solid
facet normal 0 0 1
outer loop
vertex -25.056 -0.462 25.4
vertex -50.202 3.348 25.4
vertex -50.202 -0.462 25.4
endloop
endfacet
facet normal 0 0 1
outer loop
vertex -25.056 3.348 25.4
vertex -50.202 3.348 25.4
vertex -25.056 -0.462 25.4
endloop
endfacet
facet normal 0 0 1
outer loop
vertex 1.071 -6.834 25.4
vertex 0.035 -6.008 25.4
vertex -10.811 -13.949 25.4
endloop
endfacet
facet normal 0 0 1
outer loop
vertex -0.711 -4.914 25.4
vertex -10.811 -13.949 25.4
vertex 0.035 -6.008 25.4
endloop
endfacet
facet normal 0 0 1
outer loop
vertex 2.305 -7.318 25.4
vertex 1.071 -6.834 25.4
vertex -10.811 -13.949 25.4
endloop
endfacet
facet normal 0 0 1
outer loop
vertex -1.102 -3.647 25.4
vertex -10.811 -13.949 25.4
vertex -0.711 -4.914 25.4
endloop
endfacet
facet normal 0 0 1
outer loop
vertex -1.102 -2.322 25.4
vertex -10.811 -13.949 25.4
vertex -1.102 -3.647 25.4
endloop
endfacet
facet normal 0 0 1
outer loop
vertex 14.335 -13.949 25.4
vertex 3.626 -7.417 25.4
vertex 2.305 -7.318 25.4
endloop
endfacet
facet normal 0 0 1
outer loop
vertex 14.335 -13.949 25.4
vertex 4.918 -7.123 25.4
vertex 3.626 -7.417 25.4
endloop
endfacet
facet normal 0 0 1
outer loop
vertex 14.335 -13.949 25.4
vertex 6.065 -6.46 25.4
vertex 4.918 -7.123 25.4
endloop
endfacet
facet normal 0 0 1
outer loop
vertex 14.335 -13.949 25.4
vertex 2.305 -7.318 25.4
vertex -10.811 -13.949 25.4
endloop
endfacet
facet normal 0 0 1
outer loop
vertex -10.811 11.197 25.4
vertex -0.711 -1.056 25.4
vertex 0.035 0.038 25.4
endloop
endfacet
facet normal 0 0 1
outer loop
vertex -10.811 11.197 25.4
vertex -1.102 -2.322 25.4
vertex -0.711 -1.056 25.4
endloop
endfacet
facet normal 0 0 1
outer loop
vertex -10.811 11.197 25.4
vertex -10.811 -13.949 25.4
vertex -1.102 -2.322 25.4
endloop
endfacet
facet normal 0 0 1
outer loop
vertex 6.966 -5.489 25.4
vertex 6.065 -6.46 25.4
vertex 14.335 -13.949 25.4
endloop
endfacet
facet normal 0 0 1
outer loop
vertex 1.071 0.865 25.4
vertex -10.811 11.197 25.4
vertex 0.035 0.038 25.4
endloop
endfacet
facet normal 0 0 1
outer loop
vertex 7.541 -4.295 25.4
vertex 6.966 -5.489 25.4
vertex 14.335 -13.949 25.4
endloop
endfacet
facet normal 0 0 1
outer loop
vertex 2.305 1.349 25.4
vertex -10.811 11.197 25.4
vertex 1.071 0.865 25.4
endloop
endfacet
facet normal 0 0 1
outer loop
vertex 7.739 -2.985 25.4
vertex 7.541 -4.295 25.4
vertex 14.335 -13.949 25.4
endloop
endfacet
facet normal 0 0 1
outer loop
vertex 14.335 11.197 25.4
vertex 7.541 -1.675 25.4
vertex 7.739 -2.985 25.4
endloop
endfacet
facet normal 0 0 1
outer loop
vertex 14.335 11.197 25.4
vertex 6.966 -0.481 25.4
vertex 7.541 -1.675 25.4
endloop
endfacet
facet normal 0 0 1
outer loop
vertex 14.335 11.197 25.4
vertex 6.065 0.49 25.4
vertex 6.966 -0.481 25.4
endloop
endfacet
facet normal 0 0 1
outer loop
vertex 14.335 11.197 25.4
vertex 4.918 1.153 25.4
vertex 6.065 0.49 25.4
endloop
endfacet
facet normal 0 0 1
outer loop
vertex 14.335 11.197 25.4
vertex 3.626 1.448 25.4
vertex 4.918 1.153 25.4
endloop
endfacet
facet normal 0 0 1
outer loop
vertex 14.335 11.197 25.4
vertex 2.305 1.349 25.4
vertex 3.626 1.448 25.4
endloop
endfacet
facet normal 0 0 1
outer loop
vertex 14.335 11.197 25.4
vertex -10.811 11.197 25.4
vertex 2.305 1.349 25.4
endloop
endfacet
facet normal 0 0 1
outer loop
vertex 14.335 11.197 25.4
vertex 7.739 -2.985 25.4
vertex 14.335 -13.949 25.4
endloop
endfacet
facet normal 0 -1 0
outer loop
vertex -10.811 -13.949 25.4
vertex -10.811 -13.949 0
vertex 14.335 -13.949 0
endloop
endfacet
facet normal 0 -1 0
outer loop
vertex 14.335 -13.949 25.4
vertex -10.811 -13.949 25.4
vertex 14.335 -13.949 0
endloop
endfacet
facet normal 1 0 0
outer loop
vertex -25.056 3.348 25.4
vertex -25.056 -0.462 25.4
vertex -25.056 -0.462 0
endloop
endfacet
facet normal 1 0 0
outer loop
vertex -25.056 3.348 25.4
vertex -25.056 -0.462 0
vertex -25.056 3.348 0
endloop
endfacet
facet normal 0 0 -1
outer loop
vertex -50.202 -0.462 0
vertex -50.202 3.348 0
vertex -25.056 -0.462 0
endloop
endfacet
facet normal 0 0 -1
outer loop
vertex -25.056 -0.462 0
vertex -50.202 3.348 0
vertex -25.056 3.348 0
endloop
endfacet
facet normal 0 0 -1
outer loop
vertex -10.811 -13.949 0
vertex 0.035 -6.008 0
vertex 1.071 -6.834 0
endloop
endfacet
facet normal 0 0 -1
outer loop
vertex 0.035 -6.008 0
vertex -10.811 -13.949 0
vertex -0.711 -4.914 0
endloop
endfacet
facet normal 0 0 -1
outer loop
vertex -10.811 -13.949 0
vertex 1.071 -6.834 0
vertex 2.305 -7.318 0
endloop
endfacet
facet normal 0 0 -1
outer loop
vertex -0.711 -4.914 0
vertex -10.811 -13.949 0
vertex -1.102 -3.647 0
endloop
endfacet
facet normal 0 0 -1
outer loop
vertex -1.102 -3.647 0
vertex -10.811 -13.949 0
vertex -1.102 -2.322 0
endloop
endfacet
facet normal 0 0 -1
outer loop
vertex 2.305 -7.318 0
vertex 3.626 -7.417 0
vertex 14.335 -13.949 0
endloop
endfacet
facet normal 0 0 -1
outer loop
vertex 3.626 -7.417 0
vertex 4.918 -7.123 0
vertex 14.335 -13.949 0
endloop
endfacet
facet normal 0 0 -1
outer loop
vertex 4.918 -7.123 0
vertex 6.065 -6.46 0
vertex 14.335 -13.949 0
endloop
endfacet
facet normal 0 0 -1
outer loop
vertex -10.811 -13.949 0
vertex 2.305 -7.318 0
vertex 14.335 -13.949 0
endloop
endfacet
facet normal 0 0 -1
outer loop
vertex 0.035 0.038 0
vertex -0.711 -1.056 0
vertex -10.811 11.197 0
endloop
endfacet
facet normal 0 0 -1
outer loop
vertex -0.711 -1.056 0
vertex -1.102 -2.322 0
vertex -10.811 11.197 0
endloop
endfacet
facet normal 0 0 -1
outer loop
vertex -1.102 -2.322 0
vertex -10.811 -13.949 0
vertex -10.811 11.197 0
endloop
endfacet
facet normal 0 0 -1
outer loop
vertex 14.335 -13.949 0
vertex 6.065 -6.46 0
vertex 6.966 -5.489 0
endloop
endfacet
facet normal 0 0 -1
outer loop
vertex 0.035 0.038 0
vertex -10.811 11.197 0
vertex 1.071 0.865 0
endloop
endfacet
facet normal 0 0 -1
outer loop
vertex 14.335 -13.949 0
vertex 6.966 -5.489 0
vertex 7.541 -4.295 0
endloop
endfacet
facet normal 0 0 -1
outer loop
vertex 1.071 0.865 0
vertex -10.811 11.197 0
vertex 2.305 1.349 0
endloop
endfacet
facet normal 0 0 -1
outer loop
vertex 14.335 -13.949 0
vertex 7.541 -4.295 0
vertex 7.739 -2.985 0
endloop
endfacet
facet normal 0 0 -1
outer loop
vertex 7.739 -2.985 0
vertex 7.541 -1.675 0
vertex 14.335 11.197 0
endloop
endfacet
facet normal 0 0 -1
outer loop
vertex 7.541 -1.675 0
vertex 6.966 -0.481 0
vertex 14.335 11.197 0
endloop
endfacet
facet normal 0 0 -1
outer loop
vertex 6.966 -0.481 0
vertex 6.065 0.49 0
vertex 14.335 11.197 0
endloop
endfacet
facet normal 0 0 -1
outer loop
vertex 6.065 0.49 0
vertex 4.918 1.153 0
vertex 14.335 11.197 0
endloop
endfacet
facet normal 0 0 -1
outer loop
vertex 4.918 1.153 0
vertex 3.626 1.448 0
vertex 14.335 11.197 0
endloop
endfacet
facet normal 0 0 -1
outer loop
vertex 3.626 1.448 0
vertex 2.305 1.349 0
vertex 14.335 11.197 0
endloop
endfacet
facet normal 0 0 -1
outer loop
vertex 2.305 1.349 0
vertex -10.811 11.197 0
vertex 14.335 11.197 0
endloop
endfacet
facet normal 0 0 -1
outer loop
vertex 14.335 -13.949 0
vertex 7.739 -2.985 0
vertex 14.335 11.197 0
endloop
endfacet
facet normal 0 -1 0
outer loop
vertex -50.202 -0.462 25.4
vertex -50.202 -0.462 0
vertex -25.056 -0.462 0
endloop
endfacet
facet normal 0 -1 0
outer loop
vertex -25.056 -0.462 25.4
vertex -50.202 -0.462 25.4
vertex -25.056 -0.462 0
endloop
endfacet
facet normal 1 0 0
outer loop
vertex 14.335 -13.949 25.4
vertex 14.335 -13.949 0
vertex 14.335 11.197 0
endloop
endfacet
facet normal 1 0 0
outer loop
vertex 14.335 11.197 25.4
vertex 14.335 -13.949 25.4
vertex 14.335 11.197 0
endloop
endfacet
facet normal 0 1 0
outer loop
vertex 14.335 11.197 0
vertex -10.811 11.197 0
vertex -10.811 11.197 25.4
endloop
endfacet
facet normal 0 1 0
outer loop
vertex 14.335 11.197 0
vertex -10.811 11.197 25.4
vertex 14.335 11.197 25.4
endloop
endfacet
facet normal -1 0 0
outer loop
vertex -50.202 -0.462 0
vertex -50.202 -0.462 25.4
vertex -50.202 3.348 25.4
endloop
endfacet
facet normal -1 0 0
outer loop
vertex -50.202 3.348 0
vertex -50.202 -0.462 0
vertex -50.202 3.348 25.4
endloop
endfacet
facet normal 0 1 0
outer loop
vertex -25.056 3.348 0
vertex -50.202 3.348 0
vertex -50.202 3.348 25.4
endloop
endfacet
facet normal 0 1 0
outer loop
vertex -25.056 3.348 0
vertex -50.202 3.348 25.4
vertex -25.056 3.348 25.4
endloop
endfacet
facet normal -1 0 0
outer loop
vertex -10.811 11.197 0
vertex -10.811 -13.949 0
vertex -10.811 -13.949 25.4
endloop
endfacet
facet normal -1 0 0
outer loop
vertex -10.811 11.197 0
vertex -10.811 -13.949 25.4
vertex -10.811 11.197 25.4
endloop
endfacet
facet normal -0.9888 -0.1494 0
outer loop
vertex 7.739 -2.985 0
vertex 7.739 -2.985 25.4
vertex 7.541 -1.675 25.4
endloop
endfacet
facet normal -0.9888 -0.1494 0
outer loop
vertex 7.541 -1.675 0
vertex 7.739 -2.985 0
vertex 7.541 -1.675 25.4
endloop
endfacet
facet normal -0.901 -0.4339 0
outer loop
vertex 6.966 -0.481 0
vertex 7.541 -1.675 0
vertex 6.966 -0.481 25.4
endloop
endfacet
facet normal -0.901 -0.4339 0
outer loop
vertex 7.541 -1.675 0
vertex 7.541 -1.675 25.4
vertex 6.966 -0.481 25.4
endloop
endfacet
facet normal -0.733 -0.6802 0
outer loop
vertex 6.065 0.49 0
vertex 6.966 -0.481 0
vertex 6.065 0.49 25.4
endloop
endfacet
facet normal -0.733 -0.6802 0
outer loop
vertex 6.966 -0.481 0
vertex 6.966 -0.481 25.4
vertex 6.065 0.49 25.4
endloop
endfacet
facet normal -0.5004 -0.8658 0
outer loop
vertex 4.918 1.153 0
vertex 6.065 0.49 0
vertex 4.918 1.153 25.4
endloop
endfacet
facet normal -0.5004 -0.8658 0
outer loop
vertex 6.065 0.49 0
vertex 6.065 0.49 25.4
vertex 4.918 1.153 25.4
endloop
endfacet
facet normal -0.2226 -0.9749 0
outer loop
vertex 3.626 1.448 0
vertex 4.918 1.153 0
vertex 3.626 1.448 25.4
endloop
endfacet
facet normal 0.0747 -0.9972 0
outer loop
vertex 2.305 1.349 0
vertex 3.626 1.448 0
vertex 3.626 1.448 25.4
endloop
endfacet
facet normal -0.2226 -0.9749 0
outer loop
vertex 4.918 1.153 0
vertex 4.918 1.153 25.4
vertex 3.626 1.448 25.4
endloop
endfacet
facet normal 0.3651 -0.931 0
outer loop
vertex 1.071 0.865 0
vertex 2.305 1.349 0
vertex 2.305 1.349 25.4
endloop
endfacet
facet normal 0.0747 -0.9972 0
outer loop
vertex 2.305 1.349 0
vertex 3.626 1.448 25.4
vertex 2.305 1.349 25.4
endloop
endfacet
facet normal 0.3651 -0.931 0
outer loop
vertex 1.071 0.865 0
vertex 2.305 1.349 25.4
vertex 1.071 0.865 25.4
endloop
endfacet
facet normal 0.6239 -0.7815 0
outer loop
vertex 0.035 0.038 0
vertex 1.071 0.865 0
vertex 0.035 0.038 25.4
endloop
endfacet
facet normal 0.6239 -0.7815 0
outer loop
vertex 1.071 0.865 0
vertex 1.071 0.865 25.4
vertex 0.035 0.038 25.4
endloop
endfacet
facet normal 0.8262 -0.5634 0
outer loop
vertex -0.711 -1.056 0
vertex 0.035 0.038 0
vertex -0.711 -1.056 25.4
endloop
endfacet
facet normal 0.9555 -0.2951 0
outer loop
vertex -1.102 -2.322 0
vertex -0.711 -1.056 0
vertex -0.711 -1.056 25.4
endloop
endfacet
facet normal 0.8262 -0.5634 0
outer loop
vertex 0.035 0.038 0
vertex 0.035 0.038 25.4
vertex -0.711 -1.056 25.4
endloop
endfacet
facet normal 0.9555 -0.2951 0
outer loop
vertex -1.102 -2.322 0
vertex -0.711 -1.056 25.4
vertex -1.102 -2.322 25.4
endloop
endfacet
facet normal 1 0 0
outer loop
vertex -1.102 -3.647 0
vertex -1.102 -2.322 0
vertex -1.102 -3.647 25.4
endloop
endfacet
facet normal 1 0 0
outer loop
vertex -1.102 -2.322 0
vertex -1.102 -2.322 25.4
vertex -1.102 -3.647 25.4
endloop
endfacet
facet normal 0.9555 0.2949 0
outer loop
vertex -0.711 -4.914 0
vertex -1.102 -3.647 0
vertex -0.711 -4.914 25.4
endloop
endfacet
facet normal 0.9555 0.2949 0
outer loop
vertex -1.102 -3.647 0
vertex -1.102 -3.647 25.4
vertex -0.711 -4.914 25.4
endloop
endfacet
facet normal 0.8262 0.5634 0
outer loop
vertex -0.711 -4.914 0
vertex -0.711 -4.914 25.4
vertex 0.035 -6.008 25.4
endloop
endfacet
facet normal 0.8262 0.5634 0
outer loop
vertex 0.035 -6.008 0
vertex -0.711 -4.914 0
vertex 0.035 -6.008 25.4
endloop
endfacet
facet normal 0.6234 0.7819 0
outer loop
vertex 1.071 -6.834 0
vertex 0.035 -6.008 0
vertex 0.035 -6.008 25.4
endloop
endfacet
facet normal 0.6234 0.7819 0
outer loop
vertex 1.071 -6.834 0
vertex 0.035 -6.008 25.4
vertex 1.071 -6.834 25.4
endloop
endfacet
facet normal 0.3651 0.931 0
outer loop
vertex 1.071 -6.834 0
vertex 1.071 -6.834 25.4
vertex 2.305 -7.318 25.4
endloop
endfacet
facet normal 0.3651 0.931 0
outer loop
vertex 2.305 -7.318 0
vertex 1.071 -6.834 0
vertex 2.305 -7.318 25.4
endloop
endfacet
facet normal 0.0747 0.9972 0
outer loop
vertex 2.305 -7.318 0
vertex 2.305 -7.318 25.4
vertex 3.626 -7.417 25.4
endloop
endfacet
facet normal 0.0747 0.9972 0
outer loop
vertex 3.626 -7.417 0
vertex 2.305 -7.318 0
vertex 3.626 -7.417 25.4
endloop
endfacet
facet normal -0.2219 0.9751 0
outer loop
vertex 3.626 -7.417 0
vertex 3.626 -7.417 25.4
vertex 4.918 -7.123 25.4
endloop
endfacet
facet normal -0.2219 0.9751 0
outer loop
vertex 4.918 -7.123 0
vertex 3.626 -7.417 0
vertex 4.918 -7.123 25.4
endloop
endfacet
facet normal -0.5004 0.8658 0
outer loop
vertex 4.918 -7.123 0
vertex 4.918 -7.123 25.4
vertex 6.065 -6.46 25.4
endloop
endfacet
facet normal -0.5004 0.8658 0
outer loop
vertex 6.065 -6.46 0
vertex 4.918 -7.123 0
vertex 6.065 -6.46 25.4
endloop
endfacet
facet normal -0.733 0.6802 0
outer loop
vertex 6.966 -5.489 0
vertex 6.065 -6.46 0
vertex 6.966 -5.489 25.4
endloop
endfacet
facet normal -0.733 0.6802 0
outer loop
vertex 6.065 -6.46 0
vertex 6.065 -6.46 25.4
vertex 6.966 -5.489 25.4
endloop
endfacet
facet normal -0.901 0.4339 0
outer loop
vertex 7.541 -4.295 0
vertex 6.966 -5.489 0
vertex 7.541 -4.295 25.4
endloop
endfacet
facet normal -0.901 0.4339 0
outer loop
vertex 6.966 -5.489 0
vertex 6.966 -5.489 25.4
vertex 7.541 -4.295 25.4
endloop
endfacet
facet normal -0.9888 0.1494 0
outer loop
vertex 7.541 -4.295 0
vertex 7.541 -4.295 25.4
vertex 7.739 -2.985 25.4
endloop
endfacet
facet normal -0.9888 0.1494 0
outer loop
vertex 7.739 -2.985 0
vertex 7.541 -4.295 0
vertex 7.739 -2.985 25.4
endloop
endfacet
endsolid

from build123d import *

# Parameters (mm, degrees)
F0_W     = 25.146
F0_H     = 25.146
F1_DEPTH = 25.4
F2_R     = 4.445
F3_DEPTH = 25.4
F4_W     = 25.146
F4_H     = 3.81
F5_DEPTH = 25.4


with BuildPart() as f1:
    # F0 (on Top) → F1 (new body)
    with BuildSketch(Plane.XY):
        with Locations((1.762159, -1.375717)):
            Rectangle(F0_W, F0_H)
    extrude(amount=F1_DEPTH)

    # F2 (on face) → F3 (cut)
    with BuildSketch(Plane.XY.offset(25.4)):
        with Locations((3.29368, -2.984911)):
            Circle(F2_R)
    extrude(amount=-F3_DEPTH, mode=Mode.SUBTRACT)


with BuildPart() as f5:
    # F4 (on Top) → F5 (new body)
    with BuildSketch(Plane.XY):
        with Locations((-37.628851, 1.442708)):
            Rectangle(F4_W, F4_H)
    extrude(amount=F5_DEPTH)


solid = Compound([f1.part, f5.part])
